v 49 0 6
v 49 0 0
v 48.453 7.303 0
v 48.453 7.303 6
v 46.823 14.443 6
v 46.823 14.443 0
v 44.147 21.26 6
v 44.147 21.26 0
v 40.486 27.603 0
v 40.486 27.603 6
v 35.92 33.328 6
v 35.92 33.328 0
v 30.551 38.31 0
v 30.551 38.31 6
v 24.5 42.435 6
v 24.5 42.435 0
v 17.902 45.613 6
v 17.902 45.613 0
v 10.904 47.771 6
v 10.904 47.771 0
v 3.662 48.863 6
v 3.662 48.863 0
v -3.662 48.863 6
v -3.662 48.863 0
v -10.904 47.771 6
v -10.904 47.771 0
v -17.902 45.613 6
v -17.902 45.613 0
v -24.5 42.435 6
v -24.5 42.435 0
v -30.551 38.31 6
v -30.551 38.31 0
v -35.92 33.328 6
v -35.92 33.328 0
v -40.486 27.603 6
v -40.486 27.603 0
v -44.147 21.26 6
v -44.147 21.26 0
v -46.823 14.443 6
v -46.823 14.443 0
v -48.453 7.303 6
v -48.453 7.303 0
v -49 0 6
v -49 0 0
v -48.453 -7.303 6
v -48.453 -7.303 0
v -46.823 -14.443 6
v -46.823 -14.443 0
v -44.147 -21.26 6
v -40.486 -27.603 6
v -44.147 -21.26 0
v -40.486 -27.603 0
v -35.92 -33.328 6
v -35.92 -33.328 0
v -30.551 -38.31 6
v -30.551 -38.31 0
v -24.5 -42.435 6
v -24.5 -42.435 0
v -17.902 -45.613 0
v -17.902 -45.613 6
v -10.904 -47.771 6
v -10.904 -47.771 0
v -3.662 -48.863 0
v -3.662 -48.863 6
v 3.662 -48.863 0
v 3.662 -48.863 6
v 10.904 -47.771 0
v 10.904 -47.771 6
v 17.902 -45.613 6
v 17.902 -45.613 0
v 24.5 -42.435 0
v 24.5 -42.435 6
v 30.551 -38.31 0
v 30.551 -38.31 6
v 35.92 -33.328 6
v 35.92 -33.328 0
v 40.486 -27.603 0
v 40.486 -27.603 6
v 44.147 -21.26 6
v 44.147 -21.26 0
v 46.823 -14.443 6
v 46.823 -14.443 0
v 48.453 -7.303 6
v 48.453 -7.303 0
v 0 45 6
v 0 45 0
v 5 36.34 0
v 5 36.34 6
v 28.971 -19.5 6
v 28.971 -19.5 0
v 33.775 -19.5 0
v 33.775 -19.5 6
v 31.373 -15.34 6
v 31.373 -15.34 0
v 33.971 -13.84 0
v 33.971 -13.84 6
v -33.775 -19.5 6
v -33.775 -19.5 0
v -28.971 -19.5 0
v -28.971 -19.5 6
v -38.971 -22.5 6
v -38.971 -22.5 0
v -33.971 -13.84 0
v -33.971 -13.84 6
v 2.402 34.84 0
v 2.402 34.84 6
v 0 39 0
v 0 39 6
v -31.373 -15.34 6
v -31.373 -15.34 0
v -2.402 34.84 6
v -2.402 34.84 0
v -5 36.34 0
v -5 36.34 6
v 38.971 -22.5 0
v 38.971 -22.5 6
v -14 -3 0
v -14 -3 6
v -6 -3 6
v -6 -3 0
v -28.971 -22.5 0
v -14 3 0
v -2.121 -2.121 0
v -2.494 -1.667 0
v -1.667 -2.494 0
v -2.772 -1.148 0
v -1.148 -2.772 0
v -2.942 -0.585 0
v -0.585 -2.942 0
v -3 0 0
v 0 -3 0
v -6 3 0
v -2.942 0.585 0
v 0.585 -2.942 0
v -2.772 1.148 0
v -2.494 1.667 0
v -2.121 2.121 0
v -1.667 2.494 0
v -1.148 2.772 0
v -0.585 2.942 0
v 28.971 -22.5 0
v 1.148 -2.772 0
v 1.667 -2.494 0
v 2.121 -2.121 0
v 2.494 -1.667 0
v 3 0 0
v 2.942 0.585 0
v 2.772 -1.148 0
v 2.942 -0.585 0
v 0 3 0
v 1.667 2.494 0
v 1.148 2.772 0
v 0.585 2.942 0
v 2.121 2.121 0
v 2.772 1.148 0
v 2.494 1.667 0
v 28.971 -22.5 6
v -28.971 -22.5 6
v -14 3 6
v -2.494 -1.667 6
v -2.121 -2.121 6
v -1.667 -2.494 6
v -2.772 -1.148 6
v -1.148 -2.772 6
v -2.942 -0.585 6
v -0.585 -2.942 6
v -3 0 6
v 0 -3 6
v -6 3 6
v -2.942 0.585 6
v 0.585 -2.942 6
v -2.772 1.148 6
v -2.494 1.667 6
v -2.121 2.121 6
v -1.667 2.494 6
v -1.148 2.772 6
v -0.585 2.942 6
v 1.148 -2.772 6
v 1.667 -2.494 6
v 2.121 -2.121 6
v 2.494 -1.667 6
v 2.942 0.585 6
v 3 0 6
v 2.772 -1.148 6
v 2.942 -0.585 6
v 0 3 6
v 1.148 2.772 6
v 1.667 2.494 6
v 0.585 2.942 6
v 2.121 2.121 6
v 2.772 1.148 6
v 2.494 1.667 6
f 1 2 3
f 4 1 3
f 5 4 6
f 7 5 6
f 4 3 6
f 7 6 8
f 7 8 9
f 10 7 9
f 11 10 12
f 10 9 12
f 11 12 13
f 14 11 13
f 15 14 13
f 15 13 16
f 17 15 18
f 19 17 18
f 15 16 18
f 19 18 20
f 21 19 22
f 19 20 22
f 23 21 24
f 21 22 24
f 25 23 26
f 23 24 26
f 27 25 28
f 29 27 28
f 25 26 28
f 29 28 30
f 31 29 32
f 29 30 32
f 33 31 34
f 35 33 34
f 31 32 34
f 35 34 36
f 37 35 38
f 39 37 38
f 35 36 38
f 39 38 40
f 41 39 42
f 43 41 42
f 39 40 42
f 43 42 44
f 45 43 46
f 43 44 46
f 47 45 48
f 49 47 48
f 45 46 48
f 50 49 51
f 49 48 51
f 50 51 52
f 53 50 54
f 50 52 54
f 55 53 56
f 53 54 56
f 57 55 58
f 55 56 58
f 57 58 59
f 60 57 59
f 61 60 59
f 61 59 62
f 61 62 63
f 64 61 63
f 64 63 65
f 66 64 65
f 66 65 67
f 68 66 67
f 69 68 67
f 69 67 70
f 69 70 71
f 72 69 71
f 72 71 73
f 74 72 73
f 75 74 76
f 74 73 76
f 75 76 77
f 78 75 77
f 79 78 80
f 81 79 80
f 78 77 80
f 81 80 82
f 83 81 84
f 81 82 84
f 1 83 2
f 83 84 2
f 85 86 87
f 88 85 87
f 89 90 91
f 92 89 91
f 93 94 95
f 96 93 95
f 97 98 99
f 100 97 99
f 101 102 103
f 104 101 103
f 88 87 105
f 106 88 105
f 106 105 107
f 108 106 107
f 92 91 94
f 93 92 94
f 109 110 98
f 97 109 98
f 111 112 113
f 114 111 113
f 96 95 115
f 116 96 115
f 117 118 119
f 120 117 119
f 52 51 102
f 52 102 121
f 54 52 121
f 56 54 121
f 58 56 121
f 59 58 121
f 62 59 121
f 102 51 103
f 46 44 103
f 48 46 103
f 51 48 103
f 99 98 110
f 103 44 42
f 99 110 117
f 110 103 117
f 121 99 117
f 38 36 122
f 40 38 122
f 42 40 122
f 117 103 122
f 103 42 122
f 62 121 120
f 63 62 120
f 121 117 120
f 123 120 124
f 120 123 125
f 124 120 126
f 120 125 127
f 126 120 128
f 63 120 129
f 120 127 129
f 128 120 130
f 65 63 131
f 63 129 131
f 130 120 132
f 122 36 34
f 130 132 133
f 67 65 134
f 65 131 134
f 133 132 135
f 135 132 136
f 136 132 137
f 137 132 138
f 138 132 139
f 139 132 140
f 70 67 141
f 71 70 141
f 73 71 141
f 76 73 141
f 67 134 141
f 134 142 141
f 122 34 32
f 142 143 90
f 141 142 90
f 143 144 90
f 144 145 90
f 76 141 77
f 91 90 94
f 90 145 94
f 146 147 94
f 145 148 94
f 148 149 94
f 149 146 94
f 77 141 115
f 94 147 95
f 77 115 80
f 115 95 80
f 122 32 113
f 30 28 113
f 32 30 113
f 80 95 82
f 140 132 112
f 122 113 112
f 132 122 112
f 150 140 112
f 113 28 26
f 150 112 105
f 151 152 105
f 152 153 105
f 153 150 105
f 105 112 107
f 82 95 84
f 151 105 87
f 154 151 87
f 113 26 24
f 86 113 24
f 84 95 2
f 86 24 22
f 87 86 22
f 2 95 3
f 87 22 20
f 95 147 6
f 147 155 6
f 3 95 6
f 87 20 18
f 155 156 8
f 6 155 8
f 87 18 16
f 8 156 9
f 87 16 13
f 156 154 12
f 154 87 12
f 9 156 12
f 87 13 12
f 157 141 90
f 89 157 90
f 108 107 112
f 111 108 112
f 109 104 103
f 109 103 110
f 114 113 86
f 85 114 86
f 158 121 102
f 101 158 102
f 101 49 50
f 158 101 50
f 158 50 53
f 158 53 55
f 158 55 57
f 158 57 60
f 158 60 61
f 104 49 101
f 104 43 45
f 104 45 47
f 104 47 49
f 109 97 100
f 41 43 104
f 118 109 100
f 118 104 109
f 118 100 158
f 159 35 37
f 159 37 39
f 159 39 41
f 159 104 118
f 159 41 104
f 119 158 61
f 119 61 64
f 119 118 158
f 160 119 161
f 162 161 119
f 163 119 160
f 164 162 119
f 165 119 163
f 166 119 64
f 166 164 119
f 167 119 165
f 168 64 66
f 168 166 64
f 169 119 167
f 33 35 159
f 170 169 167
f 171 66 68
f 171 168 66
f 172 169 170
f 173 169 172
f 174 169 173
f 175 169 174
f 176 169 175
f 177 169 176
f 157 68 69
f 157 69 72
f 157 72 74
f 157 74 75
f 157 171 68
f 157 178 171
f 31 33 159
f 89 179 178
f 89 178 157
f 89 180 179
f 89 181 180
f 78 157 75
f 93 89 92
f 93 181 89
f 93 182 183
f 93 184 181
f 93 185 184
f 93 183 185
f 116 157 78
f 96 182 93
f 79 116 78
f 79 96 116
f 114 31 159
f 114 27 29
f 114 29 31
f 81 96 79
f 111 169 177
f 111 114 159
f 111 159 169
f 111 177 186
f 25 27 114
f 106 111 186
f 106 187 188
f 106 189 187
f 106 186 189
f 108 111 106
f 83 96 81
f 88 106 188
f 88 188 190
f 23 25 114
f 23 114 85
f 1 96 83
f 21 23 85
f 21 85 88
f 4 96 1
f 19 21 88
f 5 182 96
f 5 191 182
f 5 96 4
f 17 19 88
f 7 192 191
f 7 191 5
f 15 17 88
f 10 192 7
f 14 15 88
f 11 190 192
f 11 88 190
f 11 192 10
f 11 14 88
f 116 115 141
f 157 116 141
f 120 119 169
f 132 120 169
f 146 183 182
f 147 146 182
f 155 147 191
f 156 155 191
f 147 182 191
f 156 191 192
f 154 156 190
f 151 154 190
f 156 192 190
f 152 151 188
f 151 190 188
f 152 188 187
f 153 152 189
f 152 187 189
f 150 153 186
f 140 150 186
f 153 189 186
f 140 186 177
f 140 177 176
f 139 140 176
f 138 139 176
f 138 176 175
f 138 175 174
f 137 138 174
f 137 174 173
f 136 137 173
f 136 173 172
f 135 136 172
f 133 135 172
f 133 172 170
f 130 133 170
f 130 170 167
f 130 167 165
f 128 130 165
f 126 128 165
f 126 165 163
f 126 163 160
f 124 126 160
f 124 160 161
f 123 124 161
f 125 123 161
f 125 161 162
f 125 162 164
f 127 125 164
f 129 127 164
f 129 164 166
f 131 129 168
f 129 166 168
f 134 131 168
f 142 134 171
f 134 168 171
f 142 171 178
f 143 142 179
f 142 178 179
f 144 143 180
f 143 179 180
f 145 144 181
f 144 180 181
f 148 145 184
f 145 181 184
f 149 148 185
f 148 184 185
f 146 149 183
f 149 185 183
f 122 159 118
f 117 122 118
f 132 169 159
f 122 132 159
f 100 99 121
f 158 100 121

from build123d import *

# Parameters (mm, degrees)
CROQUIS1_R              = 49
SALIENTE_EXTRUIR1_DEPTH = 6
CROQUIS2_R              = 3
CORTAR_EXTRUIR1_DEPTH   = 10


with BuildPart() as part:
    # Croquis1 → Saliente-Extruir1 (new body)
    # profile 1 of 2: a face of its own
    with BuildSketch(Plane.XY):
        Circle(CROQUIS1_R)
        Polygon((-5, 36.339745962), (0, 45), (5, 36.339745962), (33.97114317, -13.839745962), (38.97114317, -22.5), (28.97114317, -22.5), (-28.97114317, -22.5), (-38.97114317, -22.5), (-33.97114317, -13.839745962), align=None, mode=Mode.SUBTRACT)
    # profile 2 of 2: a face of its own
    with BuildSketch(Plane.XY):
        Polygon((-2.401923789, 34.839745962), (-5, 36.339745962), (-33.97114317, -13.839745962), (-31.373066959, -15.339745962), (-33.774990748, -19.5), (-28.97114317, -19.5), (-28.97114317, -22.5), (28.97114317, -22.5), (28.97114317, -19.5), (33.774990748, -19.5), (31.373066959, -15.339745962), (33.97114317, -13.839745962), (5, 36.339745962), (2.401923789, 34.839745962), (0, 39), align=None)
    extrude(amount=SALIENTE_EXTRUIR1_DEPTH)

    # Croquis2 → Cortar-Extruir1 (cut)
    with BuildSketch(Plane.XY.offset(6)):
        with BuildLine():
            Line((-9.539392014, 3), (-14, 3))
            Line((-14, 3), (-14, -3))
            Line((-14, -3), (-9.539392014, -3))
            ThreePointArc((-9.539392014, -3), (-10, 0), (-9.539392014, 3))
        make_face()
        with BuildLine():
            Line((-6, 3), (-9.539392014, 3))
            ThreePointArc((-9.539392014, 3), (-10, 0), (-9.539392014, -3))
            Line((-9.539392014, -3), (-6, -3))
            Line((-6, -3), (-6, 3))
        make_face()
        Circle(CROQUIS2_R)
    extrude(amount=-CORTAR_EXTRUIR1_DEPTH, mode=Mode.SUBTRACT)


solid = part.part
